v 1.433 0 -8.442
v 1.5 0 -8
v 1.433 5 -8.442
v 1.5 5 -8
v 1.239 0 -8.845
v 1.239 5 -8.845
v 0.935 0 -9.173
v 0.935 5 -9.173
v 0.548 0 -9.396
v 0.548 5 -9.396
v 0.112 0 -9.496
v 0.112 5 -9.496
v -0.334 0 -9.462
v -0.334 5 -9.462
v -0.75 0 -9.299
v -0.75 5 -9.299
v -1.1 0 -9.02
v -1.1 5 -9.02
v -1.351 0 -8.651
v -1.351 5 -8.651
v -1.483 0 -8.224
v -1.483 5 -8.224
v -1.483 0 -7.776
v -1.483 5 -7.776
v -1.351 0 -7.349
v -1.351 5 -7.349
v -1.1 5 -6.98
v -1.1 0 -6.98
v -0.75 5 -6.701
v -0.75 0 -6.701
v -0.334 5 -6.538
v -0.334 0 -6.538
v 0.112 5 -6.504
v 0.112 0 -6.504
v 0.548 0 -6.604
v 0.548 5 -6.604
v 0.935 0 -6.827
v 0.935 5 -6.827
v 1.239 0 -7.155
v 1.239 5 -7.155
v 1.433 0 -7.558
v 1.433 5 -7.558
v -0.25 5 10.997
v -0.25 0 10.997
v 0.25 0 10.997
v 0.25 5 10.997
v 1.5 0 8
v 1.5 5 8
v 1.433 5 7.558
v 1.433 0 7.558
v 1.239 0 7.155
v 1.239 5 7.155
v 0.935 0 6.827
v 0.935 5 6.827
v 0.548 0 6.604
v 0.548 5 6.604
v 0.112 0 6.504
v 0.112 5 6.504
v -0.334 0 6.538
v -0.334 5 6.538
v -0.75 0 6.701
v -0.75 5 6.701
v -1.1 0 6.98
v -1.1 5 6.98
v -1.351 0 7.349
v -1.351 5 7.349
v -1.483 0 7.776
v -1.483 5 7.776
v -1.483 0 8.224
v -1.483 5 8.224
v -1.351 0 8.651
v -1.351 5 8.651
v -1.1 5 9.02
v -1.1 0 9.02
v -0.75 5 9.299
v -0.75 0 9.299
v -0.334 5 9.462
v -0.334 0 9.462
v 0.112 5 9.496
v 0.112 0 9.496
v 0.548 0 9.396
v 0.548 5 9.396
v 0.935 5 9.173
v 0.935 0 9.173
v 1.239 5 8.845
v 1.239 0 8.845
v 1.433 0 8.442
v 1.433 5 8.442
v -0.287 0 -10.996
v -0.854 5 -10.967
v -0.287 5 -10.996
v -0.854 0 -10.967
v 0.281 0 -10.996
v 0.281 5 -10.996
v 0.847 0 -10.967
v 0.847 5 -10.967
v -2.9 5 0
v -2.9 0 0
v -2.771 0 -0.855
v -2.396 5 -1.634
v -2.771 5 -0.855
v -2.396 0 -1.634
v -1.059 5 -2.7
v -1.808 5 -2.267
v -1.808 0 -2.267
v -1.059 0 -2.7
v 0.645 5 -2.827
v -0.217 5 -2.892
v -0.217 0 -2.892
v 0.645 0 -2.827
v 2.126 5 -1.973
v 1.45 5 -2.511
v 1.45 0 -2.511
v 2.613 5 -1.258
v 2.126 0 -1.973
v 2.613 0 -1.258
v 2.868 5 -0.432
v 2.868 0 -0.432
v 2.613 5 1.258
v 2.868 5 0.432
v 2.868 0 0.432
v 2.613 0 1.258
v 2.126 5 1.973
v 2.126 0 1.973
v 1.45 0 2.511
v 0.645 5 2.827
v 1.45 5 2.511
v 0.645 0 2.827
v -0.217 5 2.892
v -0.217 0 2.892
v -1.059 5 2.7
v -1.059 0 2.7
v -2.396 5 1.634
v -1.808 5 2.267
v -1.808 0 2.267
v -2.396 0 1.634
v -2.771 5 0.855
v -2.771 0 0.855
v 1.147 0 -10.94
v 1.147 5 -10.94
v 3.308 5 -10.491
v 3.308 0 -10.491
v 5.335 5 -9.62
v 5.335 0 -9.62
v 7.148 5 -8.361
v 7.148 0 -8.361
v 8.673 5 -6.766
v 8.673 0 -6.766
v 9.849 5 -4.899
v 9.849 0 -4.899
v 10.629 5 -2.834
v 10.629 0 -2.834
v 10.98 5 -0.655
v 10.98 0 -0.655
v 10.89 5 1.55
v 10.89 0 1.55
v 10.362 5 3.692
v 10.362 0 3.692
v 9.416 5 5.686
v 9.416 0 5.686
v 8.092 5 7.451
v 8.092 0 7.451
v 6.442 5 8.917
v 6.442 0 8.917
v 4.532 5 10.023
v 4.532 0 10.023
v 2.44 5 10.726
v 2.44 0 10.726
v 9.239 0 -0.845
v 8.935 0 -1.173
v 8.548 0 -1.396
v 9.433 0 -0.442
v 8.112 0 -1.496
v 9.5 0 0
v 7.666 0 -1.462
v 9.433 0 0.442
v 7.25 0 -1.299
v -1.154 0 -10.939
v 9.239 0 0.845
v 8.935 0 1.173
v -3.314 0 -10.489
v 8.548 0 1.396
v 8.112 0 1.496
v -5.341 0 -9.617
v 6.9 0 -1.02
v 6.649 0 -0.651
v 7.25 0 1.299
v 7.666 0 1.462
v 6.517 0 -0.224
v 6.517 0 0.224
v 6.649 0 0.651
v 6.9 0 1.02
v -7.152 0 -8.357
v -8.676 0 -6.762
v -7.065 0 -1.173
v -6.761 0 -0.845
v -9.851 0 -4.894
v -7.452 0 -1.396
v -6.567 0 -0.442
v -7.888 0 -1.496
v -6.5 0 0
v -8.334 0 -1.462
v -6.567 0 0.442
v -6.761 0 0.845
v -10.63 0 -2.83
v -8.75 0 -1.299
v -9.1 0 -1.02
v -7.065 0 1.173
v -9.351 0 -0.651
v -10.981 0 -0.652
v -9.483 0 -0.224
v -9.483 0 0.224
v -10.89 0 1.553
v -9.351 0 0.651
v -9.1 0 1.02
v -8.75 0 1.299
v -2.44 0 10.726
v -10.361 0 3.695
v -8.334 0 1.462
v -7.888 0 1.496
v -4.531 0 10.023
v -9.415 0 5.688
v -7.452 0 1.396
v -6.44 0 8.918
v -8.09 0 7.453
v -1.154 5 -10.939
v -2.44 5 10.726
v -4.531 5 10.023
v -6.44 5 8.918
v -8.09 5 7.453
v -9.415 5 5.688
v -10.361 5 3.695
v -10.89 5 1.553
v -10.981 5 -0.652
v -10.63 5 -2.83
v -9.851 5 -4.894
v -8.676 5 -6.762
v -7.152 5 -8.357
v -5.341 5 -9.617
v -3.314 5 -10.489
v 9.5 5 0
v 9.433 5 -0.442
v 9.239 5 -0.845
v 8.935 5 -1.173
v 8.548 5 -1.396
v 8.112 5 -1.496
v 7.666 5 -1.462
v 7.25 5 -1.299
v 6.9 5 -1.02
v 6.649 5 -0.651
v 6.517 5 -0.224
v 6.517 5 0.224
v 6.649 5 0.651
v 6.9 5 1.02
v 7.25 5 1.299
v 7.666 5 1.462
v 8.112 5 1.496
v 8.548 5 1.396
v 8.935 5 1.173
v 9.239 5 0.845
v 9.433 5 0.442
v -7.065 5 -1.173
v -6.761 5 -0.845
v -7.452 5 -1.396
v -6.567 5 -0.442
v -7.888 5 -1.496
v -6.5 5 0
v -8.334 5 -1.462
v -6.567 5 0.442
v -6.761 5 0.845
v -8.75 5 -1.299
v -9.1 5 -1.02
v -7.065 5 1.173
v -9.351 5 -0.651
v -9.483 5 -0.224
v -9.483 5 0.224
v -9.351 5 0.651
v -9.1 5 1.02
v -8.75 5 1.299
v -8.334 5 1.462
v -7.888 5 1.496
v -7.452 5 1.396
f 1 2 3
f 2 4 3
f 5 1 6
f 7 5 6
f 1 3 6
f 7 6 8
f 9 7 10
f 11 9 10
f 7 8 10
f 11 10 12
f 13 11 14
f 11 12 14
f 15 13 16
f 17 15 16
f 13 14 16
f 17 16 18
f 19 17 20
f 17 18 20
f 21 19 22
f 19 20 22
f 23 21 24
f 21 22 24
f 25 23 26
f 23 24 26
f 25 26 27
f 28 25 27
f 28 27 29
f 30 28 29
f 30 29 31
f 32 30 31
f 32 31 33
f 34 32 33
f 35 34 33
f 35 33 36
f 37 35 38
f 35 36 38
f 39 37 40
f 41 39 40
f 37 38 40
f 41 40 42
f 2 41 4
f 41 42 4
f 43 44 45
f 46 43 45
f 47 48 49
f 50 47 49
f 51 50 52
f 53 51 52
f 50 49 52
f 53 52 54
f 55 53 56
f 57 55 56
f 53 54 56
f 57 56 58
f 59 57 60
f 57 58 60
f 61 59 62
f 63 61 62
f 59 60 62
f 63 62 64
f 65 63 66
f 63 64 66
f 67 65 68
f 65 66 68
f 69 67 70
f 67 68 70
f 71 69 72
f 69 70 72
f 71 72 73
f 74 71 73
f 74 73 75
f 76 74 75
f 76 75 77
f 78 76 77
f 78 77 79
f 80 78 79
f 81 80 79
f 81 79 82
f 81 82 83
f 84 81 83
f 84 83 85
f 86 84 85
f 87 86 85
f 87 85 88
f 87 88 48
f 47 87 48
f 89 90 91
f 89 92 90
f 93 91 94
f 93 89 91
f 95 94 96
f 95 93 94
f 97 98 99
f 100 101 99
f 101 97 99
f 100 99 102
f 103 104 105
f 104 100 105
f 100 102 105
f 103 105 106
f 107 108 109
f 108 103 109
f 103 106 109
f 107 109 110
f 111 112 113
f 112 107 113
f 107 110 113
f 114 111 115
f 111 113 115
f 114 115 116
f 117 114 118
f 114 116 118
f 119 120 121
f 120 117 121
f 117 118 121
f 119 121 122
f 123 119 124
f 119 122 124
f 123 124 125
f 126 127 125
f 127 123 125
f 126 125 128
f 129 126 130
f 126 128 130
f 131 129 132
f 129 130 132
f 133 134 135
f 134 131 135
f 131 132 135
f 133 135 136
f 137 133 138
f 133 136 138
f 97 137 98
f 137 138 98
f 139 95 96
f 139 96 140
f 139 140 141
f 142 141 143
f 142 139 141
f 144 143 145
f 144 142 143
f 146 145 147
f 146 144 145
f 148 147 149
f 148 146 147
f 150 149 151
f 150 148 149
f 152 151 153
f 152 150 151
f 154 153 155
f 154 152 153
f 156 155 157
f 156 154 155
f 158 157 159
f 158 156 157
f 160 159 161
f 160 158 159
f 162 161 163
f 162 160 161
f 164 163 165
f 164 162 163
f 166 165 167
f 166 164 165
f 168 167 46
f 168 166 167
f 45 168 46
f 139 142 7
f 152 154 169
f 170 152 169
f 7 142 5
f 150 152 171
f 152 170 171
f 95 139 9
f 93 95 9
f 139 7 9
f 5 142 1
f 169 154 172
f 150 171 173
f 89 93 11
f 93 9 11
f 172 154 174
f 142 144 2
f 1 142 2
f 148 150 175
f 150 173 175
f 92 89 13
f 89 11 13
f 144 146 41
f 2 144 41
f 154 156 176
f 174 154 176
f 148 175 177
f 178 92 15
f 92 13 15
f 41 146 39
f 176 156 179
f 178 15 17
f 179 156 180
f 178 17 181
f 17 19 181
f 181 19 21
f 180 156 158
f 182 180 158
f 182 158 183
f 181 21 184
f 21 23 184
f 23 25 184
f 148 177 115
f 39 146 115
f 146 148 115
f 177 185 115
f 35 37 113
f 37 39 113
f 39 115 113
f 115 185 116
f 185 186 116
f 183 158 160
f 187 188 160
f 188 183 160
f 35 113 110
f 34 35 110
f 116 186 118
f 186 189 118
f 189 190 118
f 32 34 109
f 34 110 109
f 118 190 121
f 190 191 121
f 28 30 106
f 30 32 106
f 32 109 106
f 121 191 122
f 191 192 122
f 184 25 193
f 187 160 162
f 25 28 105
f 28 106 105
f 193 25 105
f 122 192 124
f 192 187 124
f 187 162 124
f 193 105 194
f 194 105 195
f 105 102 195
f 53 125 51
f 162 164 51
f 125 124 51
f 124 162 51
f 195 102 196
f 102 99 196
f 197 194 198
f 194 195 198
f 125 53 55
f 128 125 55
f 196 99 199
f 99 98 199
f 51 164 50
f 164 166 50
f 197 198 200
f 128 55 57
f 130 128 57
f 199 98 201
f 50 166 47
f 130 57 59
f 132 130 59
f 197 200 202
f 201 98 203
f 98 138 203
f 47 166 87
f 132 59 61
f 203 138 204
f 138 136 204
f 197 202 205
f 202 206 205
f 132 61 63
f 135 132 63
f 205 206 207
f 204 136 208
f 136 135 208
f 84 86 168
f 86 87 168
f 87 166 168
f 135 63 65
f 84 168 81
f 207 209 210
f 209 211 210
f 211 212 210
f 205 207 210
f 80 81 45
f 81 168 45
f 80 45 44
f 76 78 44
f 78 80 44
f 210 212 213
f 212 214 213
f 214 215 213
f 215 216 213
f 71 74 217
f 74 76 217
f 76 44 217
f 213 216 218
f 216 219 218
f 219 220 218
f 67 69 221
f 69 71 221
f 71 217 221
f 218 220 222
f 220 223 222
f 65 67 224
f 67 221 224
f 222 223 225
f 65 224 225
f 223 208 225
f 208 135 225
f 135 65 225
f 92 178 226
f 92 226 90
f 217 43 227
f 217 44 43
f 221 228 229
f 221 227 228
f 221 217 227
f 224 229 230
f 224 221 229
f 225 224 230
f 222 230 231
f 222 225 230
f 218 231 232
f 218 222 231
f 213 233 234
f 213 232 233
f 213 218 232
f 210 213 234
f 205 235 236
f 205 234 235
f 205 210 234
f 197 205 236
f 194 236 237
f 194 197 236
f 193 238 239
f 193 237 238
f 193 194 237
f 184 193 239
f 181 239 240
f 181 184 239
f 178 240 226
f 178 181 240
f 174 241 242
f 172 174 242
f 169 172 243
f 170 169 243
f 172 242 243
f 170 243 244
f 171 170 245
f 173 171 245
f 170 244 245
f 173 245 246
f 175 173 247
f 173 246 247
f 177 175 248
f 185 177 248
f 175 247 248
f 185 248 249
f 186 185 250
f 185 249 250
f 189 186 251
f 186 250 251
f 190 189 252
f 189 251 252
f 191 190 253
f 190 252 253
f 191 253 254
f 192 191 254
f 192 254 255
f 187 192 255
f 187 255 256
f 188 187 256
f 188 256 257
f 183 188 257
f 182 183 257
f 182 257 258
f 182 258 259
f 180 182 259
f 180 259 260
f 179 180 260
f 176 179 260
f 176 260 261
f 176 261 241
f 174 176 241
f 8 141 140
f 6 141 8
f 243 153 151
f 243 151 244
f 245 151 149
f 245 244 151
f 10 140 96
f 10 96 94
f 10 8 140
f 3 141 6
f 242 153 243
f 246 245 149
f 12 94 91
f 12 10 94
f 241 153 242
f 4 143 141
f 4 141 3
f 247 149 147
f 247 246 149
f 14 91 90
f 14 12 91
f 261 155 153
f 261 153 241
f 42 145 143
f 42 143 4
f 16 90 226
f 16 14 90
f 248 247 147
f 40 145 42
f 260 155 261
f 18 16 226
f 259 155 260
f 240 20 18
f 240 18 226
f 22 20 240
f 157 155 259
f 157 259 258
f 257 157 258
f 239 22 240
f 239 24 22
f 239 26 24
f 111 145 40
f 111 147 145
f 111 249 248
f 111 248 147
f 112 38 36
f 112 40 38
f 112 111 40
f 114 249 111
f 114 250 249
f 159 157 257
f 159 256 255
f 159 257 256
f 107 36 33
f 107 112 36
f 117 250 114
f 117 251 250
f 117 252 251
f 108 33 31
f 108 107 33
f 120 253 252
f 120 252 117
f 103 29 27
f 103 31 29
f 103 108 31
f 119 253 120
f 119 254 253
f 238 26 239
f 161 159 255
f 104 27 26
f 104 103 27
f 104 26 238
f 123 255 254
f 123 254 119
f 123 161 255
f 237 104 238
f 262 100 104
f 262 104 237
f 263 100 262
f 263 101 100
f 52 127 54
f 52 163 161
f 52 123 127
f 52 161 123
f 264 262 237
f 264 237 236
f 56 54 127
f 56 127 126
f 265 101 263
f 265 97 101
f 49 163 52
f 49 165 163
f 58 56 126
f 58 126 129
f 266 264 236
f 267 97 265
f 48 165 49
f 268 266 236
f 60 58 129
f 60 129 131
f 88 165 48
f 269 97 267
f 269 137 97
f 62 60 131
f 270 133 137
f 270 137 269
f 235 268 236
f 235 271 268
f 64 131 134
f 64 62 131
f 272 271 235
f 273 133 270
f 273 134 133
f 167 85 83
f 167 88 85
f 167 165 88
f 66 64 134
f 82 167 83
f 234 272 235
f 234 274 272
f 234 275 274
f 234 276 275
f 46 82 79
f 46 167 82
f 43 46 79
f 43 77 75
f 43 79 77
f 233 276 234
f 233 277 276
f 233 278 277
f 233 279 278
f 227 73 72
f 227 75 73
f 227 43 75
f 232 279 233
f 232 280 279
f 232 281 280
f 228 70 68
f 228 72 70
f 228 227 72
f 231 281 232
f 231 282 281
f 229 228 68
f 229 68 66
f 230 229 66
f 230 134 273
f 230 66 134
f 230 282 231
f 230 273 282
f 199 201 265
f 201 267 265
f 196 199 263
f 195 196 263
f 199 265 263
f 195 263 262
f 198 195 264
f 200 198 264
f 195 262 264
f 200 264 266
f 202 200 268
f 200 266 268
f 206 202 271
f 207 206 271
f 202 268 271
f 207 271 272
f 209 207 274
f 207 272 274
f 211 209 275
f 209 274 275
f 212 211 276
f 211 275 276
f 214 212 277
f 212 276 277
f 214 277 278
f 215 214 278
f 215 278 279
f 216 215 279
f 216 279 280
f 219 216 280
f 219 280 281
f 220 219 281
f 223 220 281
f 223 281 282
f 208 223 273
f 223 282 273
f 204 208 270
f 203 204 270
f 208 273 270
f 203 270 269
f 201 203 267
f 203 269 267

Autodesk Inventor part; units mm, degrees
ref_plane "YZ Plane" through (0, 0, 0) normal (1, 0, 0) x (0, 1, 0)
ref_plane "XZ Plane" through (0, 0, 0) normal (0, 1, 0) x (-1, 0, 0)
ref_plane "XY Plane" through (0, 0, 0) normal (0, 0, 1) x (1, 0, 0)
sketch "Эскиз1" plane through (0, 0, 0) normal (0, 1, 0) x (-1, 0, 0)
  arc A0 (-0.25, 9.2247) -> (0.25, 9.2247) centre (0, 8) ccw
  line L0 (-0.25, 10.9972) -> (-0.25, 9.2247)
  arc A1 (-0.25, 10.9972) -> (-1.1469, -10.94) centre (0, 0) ccw
  line L1 (-1.1469, -10.6297) -> (-1.1469, -10.94)
  line L2 (-0.8473, -10.6297) -> (-1.1469, -10.6297)
  line L3 (-0.8473, -10.9673) -> (-0.8473, -10.6297)
  arc A2 (-0.8473, -10.9673) -> (0.8535, -10.9668) centre (0, 0) ccw
  line L4 (0.8535, -10.6297) -> (0.8535, -10.9668)
  line L5 (1.1541, -10.6297) -> (0.8535, -10.6297)
  line L6 (1.1541, -10.9393) -> (1.1541, -10.6297)
  arc A3 (1.1541, -10.9393) -> (0.25, 10.9972) centre (0, 0) ccw
  line L7 (0.25, 9.2247) -> (0.25, 10.9972)
  circle A4 centre (8, 0) radius 1.25
  circle A5 centre (0, -8) radius 1.25
  circle A6 centre (-8, 0) radius 1.25
  circle A7 centre (0, -5.5) radius 0.75
  circle A8 centre (4.7631, 2.75) radius 0.75
  circle A9 centre (-4.7631, 2.75) radius 0.75
  circle A10 centre (0, 0) radius 2.9
  arc A11 (0.25, 9.2247) -> (-0.25, 9.2247) centre (0, 8) ccw
  line L8 (0.25, 10.9972) -> (-0.25, 10.9972)
  line L9 (1.1541, -10.9393) -> (0.8535, -10.9668)
  line L10 (-0.8473, -10.9673) -> (-1.1541, -10.9393)
extrude "Выдавливание1" add sketch "Эскиз1" along normal blind 5 contours A0 L7 A3 L6 L5 L4 A2 L3 L2 L1 A1 L0 | L0 L8 L7 A11 | L9 L4 L5 L6 | L1 L2 L3 L10 | A7 | A8 | A9
sketch "Эскиз2" plane through (0, 5, 0) normal (0, 1, 0) x (1, 0, 0)
  circle A0 centre (0, -8) radius 1.25 projected
  circle A1 centre (0, -8) radius 1.5
  circle A2 centre (-8, 0) radius 1.25 projected
  circle A3 centre (-8, 0) radius 1.5
  circle A4 centre (0, 8) radius 1.25 projected
  circle A5 centre (0, 8) radius 1.5
  circle A6 centre (8, 0) radius 1.25 projected
  circle A7 centre (8, 0) radius 1.5
  point P0 (0, 0)
  dimension "d2" = 3
  dimension "d3" = 3
  dimension "d4" = 3
  dimension "d5" = 3
extrude "Выдавливание2" cut sketch "Эскиз2" against normal blind 10 contours A0 | A1 | A2 | A3 | A4 | A5 | A6 | A7
properties part number "проставка"
